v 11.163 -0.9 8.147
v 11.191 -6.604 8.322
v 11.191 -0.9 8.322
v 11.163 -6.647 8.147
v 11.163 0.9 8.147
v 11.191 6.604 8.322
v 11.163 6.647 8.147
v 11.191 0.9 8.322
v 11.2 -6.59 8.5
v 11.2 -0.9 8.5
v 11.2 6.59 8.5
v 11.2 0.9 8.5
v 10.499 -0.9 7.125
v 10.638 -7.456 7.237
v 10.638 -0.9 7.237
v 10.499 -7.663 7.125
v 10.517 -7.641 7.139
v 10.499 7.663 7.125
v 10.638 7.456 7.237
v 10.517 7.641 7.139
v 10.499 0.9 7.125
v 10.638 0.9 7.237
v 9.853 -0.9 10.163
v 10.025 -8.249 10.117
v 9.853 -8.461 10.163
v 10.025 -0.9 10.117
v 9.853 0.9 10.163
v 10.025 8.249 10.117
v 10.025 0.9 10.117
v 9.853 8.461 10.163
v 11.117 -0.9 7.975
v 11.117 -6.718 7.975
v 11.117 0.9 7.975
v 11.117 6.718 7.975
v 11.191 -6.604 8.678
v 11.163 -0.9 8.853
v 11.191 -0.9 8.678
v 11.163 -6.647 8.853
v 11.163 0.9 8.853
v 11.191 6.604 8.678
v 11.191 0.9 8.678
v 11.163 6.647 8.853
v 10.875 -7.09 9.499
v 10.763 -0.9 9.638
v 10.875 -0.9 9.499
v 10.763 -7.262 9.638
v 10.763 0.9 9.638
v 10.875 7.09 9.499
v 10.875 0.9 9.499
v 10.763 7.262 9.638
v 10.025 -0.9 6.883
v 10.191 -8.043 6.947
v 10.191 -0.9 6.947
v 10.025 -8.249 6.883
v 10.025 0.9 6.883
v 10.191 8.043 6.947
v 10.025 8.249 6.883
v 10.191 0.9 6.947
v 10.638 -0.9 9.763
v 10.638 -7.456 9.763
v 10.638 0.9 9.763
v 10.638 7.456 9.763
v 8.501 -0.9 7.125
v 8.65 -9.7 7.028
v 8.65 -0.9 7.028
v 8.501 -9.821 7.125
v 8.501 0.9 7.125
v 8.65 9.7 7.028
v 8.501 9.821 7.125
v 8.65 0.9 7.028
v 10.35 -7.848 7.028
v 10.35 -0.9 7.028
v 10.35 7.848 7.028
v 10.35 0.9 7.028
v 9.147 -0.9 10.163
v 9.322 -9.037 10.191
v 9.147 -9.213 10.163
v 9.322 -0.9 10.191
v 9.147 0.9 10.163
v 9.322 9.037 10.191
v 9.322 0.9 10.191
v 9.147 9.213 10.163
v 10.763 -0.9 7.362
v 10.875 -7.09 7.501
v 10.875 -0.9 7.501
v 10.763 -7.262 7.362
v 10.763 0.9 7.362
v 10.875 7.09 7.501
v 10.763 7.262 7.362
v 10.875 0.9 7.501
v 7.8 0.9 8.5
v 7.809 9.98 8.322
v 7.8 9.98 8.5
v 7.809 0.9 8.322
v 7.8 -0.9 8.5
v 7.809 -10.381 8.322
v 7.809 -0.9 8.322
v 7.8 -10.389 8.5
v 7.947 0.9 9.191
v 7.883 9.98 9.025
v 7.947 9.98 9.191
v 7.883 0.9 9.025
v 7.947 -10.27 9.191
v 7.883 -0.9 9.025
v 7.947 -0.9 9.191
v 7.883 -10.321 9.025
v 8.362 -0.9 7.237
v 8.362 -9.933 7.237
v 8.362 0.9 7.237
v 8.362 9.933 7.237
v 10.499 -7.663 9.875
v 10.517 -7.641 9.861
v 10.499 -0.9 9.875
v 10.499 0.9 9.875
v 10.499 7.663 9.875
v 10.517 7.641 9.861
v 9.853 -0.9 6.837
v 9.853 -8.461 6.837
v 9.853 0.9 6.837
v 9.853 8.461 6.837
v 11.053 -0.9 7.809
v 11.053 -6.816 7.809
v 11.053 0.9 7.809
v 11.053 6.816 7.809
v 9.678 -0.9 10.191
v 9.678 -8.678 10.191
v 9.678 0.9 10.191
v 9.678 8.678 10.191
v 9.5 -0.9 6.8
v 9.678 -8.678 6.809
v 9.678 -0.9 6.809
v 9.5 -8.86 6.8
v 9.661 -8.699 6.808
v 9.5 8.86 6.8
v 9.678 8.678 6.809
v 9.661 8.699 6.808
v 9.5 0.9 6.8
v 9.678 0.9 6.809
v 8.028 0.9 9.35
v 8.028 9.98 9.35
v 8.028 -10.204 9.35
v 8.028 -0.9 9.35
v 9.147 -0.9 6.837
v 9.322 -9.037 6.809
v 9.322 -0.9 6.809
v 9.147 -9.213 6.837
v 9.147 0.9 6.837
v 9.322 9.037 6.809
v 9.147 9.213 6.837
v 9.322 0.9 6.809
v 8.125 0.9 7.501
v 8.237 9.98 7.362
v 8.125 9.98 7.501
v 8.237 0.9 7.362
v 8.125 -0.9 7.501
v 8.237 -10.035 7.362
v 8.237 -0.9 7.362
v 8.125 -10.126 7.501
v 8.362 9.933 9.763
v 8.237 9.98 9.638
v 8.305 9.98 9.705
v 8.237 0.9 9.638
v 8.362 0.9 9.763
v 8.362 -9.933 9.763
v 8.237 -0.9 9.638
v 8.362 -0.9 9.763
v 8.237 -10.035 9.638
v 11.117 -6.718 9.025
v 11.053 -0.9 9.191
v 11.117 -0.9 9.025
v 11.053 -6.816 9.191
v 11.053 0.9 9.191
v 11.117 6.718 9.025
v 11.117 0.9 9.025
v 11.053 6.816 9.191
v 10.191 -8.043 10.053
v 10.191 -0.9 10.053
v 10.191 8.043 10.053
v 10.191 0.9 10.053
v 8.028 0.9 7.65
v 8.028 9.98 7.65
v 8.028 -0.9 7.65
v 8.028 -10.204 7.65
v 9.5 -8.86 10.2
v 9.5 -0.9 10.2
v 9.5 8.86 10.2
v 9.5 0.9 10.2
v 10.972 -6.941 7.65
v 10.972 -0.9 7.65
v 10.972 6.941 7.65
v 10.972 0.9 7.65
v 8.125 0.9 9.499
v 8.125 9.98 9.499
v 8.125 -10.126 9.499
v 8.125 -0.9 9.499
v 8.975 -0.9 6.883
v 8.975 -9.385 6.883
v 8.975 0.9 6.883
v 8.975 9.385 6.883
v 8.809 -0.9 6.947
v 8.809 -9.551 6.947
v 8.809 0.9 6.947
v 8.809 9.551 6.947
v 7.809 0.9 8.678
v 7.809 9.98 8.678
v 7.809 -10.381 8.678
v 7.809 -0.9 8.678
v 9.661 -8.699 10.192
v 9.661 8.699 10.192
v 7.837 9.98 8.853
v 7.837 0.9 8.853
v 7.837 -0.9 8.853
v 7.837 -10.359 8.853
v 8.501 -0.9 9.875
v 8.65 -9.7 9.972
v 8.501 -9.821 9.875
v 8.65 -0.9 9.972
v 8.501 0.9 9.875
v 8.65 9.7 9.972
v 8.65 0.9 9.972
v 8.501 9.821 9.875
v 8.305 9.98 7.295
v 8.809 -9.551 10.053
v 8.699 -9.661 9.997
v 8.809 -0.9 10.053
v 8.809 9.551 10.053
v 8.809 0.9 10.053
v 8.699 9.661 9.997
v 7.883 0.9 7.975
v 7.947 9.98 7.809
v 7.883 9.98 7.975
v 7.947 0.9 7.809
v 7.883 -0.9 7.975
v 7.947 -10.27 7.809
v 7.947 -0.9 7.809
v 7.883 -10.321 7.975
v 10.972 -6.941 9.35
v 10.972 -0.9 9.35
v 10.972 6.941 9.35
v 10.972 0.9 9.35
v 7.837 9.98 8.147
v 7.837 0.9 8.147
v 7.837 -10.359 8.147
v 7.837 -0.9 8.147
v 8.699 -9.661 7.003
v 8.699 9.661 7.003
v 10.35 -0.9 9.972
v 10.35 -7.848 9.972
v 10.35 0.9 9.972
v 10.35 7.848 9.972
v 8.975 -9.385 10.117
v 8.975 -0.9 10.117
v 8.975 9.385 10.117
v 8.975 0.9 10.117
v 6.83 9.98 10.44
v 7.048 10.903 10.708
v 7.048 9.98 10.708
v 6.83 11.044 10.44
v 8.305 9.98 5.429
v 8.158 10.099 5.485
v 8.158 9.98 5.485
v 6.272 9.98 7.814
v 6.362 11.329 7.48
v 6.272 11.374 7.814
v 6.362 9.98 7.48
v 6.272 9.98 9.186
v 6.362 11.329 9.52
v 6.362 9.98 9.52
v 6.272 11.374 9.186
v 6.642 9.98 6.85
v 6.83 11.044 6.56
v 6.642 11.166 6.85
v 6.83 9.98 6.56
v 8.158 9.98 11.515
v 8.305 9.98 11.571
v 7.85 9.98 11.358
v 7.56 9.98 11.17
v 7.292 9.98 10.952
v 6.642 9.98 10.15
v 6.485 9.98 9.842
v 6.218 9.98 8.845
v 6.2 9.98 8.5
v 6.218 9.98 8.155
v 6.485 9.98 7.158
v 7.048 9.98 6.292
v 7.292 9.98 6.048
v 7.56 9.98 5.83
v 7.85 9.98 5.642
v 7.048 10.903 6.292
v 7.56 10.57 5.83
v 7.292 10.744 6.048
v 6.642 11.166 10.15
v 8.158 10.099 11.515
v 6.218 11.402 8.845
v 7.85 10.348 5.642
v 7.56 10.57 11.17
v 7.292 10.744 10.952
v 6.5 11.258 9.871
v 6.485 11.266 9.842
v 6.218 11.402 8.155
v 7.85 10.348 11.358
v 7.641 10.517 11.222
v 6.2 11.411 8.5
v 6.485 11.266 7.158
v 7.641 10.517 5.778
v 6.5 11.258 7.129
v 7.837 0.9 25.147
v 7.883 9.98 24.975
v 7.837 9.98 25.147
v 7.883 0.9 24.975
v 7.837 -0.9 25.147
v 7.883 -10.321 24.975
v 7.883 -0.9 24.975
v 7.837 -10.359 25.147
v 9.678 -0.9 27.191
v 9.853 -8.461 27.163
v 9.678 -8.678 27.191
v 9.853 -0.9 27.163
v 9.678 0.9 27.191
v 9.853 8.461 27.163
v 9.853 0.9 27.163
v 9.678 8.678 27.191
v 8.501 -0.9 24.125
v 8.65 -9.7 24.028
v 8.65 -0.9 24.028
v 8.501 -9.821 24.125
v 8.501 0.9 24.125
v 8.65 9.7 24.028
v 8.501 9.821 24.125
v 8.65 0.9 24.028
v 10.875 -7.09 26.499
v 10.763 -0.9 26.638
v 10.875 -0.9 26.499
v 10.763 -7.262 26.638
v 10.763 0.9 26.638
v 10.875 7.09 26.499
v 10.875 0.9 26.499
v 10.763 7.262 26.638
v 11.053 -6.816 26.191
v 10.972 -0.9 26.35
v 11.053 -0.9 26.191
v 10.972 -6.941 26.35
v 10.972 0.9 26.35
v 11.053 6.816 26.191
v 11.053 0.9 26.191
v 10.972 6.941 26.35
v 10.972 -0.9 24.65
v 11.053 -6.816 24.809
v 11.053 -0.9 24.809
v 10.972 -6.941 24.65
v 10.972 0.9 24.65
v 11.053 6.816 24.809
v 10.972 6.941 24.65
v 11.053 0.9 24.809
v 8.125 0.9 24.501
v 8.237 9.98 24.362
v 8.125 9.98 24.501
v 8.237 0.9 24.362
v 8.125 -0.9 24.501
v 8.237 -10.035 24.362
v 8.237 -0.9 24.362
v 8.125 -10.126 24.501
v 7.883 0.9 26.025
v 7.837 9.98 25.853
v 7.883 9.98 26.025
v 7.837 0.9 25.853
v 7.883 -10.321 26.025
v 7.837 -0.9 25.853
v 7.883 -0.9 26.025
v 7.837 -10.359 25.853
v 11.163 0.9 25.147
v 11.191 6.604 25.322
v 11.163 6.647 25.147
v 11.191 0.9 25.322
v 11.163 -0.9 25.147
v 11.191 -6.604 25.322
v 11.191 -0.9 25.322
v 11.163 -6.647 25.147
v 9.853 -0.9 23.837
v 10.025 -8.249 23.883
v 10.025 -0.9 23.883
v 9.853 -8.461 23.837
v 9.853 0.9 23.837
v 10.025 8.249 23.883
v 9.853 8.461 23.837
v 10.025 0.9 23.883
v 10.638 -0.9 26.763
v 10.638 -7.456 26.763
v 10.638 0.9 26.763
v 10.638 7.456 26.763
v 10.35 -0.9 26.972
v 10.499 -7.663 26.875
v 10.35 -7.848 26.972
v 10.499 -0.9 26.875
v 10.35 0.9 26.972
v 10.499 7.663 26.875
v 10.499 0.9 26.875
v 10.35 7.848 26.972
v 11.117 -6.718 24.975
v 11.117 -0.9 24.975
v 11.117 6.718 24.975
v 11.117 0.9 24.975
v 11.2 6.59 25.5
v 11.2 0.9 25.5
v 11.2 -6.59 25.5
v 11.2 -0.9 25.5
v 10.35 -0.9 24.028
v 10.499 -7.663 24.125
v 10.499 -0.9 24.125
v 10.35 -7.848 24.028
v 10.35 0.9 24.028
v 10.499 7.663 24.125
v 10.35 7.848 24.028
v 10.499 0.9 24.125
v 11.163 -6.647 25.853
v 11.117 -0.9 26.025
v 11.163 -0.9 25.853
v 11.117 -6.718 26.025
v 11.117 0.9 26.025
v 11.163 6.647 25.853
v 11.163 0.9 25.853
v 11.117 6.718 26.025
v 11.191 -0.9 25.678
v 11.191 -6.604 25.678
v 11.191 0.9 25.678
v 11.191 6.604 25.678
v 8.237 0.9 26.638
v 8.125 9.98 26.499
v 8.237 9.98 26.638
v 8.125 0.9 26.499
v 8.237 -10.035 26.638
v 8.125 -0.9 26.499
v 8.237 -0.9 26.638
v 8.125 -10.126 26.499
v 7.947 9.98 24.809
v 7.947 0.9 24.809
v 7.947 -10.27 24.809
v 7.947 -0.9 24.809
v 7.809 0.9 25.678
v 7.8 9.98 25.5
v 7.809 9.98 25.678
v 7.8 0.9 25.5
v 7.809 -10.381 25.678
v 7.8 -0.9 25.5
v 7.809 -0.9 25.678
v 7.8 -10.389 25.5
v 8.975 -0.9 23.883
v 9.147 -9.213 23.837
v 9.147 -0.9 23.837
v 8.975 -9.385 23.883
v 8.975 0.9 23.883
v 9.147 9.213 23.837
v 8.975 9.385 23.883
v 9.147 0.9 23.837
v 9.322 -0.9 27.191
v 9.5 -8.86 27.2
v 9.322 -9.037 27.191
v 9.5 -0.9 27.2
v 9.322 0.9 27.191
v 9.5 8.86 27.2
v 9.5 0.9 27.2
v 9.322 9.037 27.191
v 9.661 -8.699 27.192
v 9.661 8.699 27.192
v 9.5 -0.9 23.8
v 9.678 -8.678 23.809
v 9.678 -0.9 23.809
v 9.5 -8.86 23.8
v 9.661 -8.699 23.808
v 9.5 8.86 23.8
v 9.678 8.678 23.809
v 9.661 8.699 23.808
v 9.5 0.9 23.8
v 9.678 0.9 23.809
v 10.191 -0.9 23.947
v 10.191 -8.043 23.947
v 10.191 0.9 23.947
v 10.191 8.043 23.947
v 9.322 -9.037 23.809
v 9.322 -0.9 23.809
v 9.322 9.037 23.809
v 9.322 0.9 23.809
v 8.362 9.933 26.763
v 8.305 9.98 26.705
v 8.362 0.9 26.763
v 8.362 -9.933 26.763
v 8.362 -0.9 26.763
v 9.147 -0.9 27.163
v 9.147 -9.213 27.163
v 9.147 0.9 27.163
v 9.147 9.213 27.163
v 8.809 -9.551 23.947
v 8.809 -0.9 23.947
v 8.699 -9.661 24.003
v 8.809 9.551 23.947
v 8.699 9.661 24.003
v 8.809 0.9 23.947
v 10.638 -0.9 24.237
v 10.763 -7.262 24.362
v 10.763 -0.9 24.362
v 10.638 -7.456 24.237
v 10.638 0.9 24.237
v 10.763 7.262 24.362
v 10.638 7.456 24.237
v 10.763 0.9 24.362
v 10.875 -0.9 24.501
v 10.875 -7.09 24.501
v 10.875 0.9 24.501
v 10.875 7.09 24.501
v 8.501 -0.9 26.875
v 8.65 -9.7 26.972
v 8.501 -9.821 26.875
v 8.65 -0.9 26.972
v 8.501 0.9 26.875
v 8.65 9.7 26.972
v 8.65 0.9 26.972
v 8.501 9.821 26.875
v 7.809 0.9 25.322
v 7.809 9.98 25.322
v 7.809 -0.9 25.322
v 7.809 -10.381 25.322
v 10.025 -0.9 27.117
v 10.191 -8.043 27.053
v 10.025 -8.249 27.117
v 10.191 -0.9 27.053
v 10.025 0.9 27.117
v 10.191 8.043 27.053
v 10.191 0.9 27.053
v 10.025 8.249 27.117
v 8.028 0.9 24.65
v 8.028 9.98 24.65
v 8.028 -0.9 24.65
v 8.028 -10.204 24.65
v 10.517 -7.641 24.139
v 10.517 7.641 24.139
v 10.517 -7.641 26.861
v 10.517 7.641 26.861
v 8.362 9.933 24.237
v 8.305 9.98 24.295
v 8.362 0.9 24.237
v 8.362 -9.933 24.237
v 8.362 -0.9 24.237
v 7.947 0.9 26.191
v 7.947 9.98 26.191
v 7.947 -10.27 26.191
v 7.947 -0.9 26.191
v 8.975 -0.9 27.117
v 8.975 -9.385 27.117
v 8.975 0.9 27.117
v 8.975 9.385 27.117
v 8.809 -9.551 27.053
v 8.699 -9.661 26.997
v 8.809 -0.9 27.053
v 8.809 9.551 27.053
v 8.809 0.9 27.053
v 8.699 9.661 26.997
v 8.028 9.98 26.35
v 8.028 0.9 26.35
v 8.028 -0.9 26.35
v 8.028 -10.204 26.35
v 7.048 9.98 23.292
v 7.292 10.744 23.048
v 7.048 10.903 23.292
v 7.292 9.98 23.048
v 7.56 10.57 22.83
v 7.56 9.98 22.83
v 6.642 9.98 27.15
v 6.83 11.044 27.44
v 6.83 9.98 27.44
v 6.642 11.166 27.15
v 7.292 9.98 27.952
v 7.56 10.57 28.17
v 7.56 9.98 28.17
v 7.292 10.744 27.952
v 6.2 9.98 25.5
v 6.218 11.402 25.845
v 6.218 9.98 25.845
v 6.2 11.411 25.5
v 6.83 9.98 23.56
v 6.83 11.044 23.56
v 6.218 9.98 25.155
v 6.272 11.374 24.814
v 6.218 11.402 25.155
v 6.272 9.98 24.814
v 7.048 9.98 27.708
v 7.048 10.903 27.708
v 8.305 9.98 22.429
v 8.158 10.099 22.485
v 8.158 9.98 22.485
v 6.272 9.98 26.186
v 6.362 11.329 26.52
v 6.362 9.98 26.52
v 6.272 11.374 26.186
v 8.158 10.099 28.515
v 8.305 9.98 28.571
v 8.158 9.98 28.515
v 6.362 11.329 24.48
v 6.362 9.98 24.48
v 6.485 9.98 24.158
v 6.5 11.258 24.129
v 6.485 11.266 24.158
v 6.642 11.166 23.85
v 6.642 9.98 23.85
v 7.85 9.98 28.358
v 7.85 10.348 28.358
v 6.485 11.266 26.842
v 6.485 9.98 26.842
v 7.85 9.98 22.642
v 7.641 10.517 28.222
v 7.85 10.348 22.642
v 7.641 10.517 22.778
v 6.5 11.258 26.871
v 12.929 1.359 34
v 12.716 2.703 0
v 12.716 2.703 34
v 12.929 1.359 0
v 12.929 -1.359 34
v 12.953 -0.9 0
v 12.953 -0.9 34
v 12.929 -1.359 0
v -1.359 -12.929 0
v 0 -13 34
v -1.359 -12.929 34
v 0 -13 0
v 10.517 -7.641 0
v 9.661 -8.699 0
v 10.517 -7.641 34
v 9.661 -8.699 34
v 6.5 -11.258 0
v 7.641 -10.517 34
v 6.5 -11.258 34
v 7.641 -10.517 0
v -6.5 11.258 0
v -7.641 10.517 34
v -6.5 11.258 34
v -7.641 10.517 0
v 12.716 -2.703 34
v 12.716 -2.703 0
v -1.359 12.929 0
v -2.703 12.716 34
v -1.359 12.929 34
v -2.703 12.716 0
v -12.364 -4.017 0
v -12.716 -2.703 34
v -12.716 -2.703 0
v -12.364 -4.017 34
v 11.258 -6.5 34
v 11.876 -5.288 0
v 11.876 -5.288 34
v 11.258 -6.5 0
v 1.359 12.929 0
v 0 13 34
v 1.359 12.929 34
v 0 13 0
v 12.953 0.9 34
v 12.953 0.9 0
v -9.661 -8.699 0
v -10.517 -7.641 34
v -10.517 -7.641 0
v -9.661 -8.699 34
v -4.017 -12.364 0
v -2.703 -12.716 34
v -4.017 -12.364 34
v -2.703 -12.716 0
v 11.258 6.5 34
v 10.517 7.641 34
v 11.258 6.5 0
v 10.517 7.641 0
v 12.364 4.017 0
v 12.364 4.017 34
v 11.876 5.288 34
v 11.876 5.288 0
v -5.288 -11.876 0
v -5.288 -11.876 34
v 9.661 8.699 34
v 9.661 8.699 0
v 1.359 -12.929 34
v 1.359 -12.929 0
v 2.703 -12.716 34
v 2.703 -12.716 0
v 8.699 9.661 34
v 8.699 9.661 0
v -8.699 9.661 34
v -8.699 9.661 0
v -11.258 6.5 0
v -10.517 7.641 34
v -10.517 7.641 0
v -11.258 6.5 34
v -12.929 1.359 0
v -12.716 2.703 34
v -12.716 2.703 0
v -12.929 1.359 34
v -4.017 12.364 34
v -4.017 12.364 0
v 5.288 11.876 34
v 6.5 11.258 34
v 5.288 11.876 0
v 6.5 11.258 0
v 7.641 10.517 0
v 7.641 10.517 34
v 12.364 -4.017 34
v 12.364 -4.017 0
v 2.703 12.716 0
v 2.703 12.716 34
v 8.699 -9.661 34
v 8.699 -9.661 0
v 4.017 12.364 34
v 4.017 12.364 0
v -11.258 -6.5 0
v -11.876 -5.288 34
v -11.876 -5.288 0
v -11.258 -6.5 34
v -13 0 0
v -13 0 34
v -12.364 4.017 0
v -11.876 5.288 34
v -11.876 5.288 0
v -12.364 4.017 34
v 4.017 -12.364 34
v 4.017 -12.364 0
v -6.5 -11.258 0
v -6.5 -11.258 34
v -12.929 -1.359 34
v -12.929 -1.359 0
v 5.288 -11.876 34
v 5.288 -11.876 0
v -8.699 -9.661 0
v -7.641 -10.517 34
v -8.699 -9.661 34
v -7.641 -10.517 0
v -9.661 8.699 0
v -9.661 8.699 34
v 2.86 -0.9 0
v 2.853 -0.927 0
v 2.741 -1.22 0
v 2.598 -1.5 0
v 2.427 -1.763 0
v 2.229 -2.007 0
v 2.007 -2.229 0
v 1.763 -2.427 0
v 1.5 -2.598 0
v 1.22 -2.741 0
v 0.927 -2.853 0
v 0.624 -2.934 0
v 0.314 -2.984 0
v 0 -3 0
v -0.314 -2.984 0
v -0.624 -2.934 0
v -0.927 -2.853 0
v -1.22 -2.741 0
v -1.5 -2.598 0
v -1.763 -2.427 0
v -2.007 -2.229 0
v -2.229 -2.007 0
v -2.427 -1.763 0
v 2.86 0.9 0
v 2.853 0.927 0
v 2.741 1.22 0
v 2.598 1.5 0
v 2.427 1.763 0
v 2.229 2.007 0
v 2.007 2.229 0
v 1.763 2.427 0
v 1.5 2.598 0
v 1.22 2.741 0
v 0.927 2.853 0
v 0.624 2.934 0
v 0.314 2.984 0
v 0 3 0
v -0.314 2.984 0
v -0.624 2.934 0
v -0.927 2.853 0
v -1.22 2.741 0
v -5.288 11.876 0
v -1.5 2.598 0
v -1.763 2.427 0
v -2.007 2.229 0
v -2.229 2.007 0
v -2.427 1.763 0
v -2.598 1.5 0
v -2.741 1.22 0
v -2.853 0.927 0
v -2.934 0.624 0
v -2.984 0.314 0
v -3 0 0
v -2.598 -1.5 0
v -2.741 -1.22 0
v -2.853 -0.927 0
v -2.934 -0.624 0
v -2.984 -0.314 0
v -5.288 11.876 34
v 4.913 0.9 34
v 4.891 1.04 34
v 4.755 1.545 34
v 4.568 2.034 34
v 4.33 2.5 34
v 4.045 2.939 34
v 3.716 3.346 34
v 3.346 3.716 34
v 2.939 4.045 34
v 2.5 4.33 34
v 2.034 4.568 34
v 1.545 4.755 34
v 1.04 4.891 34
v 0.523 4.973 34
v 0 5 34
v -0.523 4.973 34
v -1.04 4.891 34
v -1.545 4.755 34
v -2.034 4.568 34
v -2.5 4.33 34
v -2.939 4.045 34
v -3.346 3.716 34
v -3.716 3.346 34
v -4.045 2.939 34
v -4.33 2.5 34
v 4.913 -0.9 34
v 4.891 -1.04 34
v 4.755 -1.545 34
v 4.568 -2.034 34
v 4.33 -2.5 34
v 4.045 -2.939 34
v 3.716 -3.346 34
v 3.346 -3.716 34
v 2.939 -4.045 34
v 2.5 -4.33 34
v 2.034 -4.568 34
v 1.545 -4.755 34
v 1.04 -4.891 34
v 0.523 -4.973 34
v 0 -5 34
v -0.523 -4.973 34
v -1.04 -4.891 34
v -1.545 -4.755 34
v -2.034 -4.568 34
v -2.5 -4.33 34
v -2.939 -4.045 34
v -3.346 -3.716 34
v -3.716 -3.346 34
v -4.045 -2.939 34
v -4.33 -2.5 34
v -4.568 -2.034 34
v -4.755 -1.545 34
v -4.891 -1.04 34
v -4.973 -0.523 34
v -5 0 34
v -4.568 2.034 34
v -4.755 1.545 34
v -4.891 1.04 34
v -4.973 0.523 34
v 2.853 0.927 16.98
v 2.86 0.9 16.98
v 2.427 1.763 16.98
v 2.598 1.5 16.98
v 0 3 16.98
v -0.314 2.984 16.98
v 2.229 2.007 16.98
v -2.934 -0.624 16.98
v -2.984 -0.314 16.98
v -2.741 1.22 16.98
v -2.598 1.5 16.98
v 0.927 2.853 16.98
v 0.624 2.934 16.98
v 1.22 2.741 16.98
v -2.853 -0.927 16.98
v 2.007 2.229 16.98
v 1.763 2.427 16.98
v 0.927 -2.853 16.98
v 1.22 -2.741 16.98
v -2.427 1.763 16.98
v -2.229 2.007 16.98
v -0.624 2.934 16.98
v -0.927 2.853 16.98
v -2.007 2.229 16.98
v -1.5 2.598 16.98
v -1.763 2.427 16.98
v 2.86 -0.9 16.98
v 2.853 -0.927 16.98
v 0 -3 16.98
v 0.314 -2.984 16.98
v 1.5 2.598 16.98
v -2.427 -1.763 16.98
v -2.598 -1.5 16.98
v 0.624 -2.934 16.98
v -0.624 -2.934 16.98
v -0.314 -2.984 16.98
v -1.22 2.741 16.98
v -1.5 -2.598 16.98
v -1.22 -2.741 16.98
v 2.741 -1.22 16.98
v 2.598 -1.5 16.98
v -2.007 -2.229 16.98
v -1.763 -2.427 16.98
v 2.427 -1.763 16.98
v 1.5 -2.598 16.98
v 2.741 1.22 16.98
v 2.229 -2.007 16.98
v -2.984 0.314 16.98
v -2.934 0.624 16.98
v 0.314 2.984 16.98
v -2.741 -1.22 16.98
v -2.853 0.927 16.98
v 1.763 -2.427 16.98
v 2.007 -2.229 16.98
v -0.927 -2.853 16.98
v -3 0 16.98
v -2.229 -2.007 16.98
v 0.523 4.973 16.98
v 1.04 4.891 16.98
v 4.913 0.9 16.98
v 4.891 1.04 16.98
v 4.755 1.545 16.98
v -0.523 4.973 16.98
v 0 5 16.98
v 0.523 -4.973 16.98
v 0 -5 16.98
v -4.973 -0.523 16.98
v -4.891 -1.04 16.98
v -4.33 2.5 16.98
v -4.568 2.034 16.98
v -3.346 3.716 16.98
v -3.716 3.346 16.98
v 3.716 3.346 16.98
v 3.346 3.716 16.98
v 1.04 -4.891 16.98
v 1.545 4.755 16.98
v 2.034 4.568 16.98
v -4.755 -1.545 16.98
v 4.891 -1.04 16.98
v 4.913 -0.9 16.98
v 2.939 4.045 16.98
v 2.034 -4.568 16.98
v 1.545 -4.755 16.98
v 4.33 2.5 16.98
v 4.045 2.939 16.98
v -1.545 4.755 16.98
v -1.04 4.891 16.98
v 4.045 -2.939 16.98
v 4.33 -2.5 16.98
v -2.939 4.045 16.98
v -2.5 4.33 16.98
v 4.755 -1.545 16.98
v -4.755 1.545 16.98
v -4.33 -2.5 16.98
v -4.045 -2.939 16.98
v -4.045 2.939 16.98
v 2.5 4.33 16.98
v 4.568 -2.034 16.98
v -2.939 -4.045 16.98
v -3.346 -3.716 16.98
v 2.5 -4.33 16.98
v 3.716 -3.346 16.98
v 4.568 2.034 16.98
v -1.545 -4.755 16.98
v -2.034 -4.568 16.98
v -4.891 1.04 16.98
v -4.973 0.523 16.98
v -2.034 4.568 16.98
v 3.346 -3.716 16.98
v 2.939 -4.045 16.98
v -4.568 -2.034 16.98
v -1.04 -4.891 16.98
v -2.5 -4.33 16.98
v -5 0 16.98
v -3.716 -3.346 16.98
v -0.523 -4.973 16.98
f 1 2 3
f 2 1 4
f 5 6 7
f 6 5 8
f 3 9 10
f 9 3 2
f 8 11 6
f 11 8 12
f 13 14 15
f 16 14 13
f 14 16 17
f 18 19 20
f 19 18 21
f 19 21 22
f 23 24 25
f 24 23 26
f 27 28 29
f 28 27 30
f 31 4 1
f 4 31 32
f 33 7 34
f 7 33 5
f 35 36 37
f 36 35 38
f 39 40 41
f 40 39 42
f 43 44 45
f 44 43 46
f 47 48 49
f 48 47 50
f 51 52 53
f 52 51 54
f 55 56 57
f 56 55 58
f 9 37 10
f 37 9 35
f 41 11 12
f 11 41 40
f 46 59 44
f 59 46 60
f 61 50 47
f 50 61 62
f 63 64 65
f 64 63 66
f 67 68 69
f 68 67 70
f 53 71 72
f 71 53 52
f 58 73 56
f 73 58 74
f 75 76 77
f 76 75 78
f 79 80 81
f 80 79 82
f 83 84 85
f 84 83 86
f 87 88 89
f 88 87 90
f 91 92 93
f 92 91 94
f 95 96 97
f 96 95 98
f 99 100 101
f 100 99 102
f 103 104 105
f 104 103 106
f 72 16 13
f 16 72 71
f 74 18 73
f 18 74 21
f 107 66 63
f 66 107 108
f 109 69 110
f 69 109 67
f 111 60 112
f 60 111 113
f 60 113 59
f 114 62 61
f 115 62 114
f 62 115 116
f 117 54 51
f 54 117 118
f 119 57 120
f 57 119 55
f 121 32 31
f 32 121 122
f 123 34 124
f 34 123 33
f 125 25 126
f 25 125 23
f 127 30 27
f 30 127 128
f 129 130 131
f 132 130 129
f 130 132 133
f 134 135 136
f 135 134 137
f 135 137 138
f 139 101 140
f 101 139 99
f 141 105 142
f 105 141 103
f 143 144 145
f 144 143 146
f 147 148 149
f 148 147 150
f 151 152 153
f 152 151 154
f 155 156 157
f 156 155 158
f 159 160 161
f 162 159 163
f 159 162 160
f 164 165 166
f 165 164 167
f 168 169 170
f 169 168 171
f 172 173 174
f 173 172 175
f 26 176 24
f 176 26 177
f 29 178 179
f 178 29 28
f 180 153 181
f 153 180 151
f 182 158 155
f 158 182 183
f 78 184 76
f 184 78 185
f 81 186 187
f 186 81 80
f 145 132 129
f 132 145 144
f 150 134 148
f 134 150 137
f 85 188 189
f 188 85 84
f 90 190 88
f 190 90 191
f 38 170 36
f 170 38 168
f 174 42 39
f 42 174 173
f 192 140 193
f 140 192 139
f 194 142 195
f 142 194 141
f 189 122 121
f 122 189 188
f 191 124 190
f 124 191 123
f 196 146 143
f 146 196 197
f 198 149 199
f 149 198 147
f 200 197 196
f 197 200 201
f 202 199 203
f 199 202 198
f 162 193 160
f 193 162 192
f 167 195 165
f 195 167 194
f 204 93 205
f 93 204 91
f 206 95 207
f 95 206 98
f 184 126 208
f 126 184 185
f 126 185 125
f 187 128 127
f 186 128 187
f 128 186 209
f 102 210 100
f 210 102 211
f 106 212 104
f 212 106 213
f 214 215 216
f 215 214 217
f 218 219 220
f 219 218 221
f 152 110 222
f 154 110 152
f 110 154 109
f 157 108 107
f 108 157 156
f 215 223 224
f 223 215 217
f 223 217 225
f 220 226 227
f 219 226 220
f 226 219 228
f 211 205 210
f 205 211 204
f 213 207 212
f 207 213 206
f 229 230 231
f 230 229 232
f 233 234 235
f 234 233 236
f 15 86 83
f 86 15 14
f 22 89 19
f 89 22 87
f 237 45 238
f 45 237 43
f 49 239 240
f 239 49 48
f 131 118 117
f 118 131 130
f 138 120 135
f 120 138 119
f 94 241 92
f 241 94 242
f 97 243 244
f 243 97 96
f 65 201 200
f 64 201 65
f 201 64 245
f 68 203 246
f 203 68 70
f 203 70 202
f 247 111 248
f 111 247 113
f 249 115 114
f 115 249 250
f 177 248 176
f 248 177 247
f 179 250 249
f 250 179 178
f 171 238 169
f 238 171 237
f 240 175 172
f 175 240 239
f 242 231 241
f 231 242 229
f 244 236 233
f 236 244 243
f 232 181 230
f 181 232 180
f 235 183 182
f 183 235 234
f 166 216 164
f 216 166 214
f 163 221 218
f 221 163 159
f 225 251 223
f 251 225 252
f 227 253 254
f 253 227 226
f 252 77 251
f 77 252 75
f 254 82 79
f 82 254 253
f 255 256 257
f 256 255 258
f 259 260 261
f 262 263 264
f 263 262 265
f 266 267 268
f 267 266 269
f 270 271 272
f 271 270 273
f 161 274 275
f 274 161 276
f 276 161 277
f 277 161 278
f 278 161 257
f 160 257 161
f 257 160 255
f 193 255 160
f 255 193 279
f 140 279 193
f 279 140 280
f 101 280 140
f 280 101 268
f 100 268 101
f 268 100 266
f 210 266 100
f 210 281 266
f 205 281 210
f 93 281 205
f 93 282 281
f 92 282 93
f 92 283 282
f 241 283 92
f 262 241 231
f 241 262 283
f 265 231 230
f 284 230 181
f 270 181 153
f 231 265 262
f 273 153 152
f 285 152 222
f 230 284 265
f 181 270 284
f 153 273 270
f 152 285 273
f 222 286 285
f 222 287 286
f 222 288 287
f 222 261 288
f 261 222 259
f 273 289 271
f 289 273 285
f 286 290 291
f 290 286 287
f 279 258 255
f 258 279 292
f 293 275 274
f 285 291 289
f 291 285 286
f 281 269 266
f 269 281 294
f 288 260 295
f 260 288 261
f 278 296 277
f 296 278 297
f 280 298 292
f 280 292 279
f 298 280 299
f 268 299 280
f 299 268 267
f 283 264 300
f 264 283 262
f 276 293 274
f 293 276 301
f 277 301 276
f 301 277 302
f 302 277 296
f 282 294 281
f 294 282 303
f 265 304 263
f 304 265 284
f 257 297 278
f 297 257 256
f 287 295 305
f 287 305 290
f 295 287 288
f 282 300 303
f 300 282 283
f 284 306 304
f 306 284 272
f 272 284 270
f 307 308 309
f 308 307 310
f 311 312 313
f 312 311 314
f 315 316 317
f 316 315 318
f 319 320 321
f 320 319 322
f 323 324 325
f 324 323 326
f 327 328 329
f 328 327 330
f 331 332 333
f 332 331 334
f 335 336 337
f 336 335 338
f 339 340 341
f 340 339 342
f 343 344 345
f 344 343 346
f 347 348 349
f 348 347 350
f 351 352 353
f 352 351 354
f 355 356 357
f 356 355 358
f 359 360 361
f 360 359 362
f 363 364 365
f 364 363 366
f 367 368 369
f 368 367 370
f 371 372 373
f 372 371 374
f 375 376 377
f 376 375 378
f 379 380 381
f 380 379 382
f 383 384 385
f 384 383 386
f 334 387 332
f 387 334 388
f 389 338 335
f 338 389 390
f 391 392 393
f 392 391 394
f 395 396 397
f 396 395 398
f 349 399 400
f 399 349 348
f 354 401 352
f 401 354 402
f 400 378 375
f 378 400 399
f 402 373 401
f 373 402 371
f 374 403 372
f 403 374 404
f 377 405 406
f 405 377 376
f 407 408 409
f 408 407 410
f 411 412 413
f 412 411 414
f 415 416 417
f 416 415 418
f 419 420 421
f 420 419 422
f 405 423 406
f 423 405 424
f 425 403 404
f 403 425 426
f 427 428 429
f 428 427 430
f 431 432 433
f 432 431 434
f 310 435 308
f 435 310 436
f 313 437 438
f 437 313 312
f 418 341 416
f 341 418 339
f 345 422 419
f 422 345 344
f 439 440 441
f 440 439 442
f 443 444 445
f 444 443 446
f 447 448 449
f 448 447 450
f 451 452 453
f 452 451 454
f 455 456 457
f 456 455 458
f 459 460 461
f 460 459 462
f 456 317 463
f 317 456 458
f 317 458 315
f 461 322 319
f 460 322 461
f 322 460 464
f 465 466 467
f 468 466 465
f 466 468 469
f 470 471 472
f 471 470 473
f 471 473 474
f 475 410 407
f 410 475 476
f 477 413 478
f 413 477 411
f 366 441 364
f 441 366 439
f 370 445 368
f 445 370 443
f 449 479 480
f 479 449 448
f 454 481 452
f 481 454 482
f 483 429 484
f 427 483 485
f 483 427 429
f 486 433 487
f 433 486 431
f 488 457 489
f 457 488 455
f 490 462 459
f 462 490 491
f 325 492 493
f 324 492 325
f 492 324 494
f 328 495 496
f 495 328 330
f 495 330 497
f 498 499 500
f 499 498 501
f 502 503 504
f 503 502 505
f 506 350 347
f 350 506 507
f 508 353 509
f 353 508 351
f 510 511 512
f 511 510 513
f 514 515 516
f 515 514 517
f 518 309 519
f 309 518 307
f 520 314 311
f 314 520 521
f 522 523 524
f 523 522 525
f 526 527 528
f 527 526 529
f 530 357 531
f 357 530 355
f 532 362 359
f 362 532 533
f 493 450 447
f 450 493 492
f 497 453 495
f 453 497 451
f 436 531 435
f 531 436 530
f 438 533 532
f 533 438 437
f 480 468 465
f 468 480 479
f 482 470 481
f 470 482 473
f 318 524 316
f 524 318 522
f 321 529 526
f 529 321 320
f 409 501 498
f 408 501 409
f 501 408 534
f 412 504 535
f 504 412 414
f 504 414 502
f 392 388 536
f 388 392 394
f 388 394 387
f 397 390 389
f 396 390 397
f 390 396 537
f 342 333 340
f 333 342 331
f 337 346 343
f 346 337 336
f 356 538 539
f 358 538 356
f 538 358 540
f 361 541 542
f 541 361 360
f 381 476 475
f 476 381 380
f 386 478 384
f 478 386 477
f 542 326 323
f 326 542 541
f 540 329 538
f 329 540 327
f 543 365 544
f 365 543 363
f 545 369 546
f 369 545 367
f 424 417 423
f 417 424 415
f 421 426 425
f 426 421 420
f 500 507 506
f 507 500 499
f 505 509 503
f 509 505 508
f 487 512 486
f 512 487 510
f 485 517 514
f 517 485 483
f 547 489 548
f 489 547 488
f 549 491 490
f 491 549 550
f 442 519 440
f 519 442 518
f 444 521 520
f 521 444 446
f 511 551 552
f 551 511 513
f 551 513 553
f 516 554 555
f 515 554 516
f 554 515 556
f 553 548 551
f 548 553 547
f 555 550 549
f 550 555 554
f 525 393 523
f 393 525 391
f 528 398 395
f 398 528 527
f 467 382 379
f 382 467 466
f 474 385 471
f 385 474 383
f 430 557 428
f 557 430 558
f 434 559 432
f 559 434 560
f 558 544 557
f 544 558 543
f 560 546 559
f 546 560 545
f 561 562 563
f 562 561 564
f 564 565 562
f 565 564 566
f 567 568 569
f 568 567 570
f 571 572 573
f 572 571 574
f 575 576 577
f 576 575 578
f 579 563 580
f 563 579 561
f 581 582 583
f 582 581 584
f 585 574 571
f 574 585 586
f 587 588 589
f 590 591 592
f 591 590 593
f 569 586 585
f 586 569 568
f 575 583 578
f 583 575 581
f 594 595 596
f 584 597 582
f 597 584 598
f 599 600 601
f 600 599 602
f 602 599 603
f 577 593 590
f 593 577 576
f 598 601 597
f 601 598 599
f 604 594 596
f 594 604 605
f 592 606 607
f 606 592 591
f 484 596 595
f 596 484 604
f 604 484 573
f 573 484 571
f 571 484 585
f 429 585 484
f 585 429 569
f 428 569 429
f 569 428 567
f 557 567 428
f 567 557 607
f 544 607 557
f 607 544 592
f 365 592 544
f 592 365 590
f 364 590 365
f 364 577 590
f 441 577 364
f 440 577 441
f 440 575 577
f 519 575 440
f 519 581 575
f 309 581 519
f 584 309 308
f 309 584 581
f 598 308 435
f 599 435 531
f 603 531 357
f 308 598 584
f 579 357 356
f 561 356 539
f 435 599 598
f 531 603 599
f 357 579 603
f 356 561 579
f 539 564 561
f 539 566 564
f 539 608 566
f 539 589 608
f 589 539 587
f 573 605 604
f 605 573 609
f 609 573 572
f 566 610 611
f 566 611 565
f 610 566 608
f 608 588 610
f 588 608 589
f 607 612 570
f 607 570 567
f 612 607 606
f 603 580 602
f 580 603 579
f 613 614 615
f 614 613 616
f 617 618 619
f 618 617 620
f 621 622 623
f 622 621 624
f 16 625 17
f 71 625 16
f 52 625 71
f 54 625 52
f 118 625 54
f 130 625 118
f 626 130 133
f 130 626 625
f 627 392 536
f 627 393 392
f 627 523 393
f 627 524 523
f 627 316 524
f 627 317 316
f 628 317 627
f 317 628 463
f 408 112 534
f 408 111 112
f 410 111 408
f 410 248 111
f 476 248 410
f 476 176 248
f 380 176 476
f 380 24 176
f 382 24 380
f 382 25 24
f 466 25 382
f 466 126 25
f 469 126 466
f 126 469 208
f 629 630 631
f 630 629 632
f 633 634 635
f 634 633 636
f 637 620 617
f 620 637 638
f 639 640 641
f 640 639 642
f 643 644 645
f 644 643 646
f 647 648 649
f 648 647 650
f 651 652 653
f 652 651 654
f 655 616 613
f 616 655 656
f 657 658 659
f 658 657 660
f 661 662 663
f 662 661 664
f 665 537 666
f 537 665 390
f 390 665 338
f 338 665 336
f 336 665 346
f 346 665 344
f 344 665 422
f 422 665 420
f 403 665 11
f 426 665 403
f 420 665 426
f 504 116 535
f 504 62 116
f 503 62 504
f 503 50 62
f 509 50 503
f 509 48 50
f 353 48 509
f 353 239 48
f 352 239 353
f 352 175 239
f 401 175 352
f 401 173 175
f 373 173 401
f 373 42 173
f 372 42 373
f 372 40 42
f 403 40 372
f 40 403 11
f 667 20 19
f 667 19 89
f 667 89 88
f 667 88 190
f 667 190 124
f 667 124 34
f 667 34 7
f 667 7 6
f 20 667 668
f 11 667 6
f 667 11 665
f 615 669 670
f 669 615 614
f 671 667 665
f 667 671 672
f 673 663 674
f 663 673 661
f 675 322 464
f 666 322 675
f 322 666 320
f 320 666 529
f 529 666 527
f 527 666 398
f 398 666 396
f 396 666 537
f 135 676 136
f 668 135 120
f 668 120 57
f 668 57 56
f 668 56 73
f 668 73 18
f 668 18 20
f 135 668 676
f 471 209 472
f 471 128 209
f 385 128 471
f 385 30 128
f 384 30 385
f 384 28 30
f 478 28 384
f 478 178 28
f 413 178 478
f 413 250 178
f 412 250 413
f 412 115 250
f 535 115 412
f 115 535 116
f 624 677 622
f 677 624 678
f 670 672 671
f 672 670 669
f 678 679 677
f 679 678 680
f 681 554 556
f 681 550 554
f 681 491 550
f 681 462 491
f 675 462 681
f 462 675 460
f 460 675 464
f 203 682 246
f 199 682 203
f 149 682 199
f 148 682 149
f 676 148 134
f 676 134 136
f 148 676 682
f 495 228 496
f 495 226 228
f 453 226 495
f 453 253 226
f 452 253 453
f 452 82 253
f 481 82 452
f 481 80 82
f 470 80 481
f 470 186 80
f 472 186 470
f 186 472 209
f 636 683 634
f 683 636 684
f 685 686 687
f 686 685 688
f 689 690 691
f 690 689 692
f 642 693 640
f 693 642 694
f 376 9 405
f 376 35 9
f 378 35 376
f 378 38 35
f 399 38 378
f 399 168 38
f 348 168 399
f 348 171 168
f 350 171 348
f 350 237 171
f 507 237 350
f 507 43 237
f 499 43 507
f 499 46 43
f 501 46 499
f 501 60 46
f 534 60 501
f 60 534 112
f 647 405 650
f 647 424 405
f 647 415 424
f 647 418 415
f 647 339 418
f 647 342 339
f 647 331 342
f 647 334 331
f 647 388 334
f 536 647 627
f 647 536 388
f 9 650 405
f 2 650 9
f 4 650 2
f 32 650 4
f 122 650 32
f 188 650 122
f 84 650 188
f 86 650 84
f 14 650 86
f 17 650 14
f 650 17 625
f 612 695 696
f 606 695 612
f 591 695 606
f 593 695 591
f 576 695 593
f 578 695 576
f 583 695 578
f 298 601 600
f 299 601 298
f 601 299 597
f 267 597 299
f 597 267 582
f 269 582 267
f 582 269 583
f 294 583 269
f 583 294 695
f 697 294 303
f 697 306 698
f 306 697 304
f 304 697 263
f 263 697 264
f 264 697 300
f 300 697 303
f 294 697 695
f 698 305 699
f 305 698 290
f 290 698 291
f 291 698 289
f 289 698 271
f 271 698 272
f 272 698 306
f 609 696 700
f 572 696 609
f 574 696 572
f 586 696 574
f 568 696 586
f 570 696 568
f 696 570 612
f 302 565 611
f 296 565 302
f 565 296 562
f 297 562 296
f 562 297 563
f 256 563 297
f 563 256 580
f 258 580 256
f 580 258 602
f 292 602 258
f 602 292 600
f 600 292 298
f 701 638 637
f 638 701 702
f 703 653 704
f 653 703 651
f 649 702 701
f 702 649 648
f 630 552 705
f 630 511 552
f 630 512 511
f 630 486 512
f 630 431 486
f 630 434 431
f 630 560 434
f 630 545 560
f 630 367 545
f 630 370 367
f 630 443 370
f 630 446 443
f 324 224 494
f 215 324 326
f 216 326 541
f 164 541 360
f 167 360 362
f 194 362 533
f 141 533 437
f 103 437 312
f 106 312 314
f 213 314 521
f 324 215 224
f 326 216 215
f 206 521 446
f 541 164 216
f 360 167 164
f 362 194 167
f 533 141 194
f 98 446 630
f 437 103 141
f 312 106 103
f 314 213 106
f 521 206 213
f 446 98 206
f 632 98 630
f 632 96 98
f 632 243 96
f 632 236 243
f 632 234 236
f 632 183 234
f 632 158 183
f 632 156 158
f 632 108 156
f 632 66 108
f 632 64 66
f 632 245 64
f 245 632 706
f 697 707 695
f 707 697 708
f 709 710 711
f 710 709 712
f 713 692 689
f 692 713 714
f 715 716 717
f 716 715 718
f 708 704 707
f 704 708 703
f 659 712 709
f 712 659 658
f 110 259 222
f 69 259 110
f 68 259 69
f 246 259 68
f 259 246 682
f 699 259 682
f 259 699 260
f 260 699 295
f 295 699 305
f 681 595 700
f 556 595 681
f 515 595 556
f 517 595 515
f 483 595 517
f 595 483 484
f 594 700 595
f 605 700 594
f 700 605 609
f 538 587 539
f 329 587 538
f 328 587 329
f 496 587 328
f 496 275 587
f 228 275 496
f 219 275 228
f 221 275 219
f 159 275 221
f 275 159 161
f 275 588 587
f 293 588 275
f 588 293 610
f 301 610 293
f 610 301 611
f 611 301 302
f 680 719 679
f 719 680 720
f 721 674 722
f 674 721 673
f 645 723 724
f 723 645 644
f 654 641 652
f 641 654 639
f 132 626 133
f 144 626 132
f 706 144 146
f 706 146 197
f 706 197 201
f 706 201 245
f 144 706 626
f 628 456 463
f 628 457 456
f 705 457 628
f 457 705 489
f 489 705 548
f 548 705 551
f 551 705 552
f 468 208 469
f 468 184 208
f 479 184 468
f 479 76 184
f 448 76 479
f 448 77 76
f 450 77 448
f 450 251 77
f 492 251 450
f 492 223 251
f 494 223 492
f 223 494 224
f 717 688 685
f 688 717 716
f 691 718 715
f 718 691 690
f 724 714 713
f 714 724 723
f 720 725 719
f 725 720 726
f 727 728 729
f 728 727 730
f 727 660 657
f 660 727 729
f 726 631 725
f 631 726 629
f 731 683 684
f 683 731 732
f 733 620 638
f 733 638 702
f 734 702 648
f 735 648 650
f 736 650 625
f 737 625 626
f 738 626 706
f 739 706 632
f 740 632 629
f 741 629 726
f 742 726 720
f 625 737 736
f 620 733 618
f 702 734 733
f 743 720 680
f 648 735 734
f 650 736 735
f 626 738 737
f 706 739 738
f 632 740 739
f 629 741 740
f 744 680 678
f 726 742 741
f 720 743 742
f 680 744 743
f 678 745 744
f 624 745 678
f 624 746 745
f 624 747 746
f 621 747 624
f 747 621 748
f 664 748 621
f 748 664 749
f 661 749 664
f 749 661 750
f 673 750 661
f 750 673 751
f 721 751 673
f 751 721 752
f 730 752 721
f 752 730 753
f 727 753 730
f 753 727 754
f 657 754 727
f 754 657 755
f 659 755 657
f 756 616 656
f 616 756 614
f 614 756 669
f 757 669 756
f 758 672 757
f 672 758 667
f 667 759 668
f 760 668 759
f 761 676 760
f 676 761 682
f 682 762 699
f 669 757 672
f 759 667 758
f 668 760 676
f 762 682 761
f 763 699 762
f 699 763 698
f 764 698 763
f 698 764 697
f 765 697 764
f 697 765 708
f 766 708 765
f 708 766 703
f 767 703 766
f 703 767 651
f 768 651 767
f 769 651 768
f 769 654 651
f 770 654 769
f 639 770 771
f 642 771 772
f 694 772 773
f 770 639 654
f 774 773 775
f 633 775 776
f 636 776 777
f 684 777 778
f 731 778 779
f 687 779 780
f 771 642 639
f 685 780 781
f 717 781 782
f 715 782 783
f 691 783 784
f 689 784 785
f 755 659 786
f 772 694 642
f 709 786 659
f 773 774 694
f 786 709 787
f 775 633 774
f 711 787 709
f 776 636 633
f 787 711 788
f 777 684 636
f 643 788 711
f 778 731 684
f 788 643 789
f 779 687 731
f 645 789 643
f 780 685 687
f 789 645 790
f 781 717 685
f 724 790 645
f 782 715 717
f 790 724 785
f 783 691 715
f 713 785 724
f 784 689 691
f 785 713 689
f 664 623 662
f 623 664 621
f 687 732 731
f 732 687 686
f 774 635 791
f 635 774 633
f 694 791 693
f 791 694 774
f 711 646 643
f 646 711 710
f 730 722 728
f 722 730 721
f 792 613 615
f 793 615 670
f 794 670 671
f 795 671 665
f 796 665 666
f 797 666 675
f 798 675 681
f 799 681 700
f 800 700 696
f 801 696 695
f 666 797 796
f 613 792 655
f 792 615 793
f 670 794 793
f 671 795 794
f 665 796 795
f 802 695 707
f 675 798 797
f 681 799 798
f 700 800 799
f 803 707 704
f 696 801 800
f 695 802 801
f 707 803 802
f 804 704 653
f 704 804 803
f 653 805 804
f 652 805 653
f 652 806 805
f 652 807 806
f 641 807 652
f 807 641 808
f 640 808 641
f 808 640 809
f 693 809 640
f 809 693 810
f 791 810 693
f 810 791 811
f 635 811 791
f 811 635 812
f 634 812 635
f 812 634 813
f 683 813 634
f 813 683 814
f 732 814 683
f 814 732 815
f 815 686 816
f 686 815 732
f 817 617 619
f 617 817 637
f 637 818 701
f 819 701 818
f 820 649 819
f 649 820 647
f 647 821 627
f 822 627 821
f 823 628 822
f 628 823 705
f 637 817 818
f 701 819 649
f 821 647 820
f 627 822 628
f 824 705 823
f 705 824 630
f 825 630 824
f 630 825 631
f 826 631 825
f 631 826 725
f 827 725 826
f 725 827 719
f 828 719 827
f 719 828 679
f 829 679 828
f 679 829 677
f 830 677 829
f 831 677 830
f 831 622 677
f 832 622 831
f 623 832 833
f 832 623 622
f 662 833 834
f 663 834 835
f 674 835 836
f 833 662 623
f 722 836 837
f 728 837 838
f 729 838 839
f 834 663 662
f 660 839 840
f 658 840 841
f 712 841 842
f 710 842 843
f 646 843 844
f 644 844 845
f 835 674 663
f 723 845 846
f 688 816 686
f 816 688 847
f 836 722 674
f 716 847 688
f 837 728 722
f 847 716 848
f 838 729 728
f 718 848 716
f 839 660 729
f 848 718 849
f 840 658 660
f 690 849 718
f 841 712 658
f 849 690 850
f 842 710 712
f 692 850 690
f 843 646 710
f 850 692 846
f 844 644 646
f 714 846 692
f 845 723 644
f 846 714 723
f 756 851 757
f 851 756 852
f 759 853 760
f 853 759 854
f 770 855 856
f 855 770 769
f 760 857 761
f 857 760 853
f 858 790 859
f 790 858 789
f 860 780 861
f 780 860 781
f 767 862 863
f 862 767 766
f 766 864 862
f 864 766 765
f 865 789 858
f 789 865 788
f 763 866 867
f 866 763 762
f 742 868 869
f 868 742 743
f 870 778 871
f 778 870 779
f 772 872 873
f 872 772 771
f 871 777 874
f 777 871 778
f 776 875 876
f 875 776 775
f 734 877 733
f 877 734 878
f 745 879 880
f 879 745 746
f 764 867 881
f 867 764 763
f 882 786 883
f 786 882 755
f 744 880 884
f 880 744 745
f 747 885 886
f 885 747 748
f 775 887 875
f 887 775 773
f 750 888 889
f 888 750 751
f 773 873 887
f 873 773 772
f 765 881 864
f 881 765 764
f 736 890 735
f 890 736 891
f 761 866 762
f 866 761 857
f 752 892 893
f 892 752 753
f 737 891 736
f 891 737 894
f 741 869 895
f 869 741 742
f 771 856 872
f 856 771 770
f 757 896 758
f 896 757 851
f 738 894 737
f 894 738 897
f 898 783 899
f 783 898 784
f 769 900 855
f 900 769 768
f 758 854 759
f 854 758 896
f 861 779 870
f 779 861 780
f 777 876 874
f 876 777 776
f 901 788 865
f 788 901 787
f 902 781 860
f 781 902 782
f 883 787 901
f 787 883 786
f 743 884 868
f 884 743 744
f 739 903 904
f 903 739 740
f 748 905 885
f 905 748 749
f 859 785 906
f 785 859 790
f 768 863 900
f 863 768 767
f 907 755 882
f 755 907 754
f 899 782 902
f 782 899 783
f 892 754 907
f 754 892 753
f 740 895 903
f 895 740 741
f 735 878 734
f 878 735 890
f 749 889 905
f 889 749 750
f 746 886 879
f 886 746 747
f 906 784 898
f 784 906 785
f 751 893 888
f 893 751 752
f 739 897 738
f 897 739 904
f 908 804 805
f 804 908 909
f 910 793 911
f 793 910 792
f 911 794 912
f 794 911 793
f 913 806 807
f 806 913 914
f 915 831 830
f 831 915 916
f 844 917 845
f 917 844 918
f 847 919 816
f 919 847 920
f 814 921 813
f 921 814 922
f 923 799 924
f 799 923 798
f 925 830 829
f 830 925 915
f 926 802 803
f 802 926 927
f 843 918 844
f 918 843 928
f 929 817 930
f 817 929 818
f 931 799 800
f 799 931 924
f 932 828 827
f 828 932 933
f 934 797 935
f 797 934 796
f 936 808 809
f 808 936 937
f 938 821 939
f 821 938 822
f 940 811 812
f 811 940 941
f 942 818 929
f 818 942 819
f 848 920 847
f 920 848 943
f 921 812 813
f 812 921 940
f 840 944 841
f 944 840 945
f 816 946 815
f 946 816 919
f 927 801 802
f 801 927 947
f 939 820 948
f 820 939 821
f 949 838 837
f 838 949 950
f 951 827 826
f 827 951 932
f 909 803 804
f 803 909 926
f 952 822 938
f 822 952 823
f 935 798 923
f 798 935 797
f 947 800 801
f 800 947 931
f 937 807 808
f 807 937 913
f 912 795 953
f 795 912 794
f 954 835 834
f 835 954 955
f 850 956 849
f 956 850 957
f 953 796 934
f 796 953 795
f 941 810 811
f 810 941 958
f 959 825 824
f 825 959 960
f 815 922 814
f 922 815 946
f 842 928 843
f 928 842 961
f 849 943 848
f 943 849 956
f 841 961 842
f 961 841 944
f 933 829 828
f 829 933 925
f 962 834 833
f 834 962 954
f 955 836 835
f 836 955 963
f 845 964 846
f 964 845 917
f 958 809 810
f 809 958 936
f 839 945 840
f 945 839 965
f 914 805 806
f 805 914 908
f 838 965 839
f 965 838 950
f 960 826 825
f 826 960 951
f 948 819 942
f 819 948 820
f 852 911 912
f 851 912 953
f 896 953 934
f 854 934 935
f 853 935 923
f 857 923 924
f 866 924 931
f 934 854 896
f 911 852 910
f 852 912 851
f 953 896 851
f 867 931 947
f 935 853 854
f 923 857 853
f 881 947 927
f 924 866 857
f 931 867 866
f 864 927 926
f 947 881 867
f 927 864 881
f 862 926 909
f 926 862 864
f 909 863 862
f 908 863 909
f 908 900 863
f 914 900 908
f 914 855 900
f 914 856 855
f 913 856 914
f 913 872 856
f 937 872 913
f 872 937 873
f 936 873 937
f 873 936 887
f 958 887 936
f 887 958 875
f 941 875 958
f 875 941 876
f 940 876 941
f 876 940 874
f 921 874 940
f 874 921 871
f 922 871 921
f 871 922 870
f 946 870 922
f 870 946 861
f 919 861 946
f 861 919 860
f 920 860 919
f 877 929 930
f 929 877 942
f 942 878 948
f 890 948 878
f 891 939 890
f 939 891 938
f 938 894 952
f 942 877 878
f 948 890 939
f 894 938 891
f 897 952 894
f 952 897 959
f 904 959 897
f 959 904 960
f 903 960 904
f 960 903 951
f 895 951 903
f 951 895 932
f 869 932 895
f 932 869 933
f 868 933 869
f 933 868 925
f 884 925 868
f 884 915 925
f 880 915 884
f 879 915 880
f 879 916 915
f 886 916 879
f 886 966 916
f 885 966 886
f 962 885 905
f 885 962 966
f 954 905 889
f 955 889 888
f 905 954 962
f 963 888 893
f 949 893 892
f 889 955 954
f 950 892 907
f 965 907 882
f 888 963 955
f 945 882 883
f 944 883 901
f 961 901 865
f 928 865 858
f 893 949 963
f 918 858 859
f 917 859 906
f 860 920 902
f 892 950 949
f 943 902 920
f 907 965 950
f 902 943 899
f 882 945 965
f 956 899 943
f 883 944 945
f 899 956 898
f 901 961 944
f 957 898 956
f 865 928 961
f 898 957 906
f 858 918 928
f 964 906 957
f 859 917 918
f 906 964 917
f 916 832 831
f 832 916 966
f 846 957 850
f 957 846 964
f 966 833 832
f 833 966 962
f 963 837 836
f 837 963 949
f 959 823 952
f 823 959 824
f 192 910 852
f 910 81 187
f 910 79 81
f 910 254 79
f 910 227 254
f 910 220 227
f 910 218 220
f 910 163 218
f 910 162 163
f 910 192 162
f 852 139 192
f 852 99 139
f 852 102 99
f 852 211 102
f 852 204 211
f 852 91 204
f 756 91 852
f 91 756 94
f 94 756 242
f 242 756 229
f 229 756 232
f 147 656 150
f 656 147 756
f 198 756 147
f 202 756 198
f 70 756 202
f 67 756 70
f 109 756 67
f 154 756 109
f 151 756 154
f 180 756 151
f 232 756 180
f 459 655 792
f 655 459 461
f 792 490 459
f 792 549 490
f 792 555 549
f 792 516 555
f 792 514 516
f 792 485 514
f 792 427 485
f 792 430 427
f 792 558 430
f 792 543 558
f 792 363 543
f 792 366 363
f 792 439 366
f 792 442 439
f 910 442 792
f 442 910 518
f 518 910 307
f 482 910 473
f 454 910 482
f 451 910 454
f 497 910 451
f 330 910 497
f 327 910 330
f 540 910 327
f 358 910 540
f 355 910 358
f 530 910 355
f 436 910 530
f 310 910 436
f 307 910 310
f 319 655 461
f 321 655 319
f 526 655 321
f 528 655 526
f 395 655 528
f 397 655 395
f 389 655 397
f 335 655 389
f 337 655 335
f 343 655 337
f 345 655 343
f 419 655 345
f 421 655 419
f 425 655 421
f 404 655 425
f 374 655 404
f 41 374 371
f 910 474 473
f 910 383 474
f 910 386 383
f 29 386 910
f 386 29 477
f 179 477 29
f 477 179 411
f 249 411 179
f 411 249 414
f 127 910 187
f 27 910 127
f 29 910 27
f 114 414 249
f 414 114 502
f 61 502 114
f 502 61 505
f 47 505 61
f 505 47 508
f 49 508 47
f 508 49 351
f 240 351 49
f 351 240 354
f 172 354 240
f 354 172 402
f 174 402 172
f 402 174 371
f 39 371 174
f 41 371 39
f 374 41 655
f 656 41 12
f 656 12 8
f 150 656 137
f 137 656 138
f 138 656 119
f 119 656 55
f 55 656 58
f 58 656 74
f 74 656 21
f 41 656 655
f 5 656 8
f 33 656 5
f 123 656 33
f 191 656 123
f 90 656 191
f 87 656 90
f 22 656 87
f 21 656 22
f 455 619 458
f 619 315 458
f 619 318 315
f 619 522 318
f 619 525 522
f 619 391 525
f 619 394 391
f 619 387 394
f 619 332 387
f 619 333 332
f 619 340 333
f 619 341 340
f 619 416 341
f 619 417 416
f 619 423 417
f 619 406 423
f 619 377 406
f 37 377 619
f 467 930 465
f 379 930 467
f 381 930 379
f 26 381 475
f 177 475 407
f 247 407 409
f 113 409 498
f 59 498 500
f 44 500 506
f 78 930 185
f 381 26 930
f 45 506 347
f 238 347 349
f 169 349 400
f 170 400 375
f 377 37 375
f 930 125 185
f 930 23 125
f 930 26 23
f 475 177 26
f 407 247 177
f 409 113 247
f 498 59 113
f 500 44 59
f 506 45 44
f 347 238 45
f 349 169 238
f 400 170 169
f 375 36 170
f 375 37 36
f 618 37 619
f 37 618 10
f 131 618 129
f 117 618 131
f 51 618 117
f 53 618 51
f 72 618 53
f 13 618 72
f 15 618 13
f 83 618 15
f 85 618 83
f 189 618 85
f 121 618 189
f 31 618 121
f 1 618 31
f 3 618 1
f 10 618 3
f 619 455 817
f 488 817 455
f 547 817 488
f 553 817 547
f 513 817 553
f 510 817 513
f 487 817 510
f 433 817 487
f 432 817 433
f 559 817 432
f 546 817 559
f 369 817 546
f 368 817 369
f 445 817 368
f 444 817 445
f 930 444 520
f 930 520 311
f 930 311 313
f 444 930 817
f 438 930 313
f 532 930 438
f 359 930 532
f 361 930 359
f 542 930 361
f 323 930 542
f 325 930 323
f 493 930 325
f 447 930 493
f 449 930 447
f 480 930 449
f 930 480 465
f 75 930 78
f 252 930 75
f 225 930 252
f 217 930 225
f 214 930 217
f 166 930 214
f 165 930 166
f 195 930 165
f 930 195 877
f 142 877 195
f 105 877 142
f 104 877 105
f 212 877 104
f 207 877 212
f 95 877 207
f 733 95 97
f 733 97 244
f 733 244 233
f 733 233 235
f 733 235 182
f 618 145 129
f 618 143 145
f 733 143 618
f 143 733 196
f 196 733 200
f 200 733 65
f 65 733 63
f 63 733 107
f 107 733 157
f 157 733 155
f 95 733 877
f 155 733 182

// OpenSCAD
// Split shaft coupling 6 mm to 10 mm.
$fn = 60;
eps = 0.02;
shaft_a = 6;
shaft_b = 10;
outer_d = 26;
length = 34;
slit_w = 1.8;
screw_d = 3.4;
module clamp_hole(z) {
    translate([outer_d / 2 - 3.5, -outer_d / 2 - eps, z]) rotate([-90, 0, 0]) cylinder(d = screw_d, h = outer_d + 2 * eps);
    translate([outer_d / 2 - 3.5, outer_d / 2 - 3 - eps, z]) rotate([-90, 0, 0]) cylinder(d = 6.6, h = 3 + 2 * eps);
}
difference() {
    cylinder(d = outer_d, h = length);
    translate([0, 0, -eps]) cylinder(d = shaft_a, h = length / 2 + eps);
    translate([0, 0, length / 2 - eps]) cylinder(d = shaft_b, h = length / 2 + eps);
    translate([0, -slit_w / 2, -eps]) cube([outer_d / 2 + eps, slit_w, length + 2 * eps]);
    clamp_hole(length / 4);
    clamp_hole(3 * length / 4);
}
